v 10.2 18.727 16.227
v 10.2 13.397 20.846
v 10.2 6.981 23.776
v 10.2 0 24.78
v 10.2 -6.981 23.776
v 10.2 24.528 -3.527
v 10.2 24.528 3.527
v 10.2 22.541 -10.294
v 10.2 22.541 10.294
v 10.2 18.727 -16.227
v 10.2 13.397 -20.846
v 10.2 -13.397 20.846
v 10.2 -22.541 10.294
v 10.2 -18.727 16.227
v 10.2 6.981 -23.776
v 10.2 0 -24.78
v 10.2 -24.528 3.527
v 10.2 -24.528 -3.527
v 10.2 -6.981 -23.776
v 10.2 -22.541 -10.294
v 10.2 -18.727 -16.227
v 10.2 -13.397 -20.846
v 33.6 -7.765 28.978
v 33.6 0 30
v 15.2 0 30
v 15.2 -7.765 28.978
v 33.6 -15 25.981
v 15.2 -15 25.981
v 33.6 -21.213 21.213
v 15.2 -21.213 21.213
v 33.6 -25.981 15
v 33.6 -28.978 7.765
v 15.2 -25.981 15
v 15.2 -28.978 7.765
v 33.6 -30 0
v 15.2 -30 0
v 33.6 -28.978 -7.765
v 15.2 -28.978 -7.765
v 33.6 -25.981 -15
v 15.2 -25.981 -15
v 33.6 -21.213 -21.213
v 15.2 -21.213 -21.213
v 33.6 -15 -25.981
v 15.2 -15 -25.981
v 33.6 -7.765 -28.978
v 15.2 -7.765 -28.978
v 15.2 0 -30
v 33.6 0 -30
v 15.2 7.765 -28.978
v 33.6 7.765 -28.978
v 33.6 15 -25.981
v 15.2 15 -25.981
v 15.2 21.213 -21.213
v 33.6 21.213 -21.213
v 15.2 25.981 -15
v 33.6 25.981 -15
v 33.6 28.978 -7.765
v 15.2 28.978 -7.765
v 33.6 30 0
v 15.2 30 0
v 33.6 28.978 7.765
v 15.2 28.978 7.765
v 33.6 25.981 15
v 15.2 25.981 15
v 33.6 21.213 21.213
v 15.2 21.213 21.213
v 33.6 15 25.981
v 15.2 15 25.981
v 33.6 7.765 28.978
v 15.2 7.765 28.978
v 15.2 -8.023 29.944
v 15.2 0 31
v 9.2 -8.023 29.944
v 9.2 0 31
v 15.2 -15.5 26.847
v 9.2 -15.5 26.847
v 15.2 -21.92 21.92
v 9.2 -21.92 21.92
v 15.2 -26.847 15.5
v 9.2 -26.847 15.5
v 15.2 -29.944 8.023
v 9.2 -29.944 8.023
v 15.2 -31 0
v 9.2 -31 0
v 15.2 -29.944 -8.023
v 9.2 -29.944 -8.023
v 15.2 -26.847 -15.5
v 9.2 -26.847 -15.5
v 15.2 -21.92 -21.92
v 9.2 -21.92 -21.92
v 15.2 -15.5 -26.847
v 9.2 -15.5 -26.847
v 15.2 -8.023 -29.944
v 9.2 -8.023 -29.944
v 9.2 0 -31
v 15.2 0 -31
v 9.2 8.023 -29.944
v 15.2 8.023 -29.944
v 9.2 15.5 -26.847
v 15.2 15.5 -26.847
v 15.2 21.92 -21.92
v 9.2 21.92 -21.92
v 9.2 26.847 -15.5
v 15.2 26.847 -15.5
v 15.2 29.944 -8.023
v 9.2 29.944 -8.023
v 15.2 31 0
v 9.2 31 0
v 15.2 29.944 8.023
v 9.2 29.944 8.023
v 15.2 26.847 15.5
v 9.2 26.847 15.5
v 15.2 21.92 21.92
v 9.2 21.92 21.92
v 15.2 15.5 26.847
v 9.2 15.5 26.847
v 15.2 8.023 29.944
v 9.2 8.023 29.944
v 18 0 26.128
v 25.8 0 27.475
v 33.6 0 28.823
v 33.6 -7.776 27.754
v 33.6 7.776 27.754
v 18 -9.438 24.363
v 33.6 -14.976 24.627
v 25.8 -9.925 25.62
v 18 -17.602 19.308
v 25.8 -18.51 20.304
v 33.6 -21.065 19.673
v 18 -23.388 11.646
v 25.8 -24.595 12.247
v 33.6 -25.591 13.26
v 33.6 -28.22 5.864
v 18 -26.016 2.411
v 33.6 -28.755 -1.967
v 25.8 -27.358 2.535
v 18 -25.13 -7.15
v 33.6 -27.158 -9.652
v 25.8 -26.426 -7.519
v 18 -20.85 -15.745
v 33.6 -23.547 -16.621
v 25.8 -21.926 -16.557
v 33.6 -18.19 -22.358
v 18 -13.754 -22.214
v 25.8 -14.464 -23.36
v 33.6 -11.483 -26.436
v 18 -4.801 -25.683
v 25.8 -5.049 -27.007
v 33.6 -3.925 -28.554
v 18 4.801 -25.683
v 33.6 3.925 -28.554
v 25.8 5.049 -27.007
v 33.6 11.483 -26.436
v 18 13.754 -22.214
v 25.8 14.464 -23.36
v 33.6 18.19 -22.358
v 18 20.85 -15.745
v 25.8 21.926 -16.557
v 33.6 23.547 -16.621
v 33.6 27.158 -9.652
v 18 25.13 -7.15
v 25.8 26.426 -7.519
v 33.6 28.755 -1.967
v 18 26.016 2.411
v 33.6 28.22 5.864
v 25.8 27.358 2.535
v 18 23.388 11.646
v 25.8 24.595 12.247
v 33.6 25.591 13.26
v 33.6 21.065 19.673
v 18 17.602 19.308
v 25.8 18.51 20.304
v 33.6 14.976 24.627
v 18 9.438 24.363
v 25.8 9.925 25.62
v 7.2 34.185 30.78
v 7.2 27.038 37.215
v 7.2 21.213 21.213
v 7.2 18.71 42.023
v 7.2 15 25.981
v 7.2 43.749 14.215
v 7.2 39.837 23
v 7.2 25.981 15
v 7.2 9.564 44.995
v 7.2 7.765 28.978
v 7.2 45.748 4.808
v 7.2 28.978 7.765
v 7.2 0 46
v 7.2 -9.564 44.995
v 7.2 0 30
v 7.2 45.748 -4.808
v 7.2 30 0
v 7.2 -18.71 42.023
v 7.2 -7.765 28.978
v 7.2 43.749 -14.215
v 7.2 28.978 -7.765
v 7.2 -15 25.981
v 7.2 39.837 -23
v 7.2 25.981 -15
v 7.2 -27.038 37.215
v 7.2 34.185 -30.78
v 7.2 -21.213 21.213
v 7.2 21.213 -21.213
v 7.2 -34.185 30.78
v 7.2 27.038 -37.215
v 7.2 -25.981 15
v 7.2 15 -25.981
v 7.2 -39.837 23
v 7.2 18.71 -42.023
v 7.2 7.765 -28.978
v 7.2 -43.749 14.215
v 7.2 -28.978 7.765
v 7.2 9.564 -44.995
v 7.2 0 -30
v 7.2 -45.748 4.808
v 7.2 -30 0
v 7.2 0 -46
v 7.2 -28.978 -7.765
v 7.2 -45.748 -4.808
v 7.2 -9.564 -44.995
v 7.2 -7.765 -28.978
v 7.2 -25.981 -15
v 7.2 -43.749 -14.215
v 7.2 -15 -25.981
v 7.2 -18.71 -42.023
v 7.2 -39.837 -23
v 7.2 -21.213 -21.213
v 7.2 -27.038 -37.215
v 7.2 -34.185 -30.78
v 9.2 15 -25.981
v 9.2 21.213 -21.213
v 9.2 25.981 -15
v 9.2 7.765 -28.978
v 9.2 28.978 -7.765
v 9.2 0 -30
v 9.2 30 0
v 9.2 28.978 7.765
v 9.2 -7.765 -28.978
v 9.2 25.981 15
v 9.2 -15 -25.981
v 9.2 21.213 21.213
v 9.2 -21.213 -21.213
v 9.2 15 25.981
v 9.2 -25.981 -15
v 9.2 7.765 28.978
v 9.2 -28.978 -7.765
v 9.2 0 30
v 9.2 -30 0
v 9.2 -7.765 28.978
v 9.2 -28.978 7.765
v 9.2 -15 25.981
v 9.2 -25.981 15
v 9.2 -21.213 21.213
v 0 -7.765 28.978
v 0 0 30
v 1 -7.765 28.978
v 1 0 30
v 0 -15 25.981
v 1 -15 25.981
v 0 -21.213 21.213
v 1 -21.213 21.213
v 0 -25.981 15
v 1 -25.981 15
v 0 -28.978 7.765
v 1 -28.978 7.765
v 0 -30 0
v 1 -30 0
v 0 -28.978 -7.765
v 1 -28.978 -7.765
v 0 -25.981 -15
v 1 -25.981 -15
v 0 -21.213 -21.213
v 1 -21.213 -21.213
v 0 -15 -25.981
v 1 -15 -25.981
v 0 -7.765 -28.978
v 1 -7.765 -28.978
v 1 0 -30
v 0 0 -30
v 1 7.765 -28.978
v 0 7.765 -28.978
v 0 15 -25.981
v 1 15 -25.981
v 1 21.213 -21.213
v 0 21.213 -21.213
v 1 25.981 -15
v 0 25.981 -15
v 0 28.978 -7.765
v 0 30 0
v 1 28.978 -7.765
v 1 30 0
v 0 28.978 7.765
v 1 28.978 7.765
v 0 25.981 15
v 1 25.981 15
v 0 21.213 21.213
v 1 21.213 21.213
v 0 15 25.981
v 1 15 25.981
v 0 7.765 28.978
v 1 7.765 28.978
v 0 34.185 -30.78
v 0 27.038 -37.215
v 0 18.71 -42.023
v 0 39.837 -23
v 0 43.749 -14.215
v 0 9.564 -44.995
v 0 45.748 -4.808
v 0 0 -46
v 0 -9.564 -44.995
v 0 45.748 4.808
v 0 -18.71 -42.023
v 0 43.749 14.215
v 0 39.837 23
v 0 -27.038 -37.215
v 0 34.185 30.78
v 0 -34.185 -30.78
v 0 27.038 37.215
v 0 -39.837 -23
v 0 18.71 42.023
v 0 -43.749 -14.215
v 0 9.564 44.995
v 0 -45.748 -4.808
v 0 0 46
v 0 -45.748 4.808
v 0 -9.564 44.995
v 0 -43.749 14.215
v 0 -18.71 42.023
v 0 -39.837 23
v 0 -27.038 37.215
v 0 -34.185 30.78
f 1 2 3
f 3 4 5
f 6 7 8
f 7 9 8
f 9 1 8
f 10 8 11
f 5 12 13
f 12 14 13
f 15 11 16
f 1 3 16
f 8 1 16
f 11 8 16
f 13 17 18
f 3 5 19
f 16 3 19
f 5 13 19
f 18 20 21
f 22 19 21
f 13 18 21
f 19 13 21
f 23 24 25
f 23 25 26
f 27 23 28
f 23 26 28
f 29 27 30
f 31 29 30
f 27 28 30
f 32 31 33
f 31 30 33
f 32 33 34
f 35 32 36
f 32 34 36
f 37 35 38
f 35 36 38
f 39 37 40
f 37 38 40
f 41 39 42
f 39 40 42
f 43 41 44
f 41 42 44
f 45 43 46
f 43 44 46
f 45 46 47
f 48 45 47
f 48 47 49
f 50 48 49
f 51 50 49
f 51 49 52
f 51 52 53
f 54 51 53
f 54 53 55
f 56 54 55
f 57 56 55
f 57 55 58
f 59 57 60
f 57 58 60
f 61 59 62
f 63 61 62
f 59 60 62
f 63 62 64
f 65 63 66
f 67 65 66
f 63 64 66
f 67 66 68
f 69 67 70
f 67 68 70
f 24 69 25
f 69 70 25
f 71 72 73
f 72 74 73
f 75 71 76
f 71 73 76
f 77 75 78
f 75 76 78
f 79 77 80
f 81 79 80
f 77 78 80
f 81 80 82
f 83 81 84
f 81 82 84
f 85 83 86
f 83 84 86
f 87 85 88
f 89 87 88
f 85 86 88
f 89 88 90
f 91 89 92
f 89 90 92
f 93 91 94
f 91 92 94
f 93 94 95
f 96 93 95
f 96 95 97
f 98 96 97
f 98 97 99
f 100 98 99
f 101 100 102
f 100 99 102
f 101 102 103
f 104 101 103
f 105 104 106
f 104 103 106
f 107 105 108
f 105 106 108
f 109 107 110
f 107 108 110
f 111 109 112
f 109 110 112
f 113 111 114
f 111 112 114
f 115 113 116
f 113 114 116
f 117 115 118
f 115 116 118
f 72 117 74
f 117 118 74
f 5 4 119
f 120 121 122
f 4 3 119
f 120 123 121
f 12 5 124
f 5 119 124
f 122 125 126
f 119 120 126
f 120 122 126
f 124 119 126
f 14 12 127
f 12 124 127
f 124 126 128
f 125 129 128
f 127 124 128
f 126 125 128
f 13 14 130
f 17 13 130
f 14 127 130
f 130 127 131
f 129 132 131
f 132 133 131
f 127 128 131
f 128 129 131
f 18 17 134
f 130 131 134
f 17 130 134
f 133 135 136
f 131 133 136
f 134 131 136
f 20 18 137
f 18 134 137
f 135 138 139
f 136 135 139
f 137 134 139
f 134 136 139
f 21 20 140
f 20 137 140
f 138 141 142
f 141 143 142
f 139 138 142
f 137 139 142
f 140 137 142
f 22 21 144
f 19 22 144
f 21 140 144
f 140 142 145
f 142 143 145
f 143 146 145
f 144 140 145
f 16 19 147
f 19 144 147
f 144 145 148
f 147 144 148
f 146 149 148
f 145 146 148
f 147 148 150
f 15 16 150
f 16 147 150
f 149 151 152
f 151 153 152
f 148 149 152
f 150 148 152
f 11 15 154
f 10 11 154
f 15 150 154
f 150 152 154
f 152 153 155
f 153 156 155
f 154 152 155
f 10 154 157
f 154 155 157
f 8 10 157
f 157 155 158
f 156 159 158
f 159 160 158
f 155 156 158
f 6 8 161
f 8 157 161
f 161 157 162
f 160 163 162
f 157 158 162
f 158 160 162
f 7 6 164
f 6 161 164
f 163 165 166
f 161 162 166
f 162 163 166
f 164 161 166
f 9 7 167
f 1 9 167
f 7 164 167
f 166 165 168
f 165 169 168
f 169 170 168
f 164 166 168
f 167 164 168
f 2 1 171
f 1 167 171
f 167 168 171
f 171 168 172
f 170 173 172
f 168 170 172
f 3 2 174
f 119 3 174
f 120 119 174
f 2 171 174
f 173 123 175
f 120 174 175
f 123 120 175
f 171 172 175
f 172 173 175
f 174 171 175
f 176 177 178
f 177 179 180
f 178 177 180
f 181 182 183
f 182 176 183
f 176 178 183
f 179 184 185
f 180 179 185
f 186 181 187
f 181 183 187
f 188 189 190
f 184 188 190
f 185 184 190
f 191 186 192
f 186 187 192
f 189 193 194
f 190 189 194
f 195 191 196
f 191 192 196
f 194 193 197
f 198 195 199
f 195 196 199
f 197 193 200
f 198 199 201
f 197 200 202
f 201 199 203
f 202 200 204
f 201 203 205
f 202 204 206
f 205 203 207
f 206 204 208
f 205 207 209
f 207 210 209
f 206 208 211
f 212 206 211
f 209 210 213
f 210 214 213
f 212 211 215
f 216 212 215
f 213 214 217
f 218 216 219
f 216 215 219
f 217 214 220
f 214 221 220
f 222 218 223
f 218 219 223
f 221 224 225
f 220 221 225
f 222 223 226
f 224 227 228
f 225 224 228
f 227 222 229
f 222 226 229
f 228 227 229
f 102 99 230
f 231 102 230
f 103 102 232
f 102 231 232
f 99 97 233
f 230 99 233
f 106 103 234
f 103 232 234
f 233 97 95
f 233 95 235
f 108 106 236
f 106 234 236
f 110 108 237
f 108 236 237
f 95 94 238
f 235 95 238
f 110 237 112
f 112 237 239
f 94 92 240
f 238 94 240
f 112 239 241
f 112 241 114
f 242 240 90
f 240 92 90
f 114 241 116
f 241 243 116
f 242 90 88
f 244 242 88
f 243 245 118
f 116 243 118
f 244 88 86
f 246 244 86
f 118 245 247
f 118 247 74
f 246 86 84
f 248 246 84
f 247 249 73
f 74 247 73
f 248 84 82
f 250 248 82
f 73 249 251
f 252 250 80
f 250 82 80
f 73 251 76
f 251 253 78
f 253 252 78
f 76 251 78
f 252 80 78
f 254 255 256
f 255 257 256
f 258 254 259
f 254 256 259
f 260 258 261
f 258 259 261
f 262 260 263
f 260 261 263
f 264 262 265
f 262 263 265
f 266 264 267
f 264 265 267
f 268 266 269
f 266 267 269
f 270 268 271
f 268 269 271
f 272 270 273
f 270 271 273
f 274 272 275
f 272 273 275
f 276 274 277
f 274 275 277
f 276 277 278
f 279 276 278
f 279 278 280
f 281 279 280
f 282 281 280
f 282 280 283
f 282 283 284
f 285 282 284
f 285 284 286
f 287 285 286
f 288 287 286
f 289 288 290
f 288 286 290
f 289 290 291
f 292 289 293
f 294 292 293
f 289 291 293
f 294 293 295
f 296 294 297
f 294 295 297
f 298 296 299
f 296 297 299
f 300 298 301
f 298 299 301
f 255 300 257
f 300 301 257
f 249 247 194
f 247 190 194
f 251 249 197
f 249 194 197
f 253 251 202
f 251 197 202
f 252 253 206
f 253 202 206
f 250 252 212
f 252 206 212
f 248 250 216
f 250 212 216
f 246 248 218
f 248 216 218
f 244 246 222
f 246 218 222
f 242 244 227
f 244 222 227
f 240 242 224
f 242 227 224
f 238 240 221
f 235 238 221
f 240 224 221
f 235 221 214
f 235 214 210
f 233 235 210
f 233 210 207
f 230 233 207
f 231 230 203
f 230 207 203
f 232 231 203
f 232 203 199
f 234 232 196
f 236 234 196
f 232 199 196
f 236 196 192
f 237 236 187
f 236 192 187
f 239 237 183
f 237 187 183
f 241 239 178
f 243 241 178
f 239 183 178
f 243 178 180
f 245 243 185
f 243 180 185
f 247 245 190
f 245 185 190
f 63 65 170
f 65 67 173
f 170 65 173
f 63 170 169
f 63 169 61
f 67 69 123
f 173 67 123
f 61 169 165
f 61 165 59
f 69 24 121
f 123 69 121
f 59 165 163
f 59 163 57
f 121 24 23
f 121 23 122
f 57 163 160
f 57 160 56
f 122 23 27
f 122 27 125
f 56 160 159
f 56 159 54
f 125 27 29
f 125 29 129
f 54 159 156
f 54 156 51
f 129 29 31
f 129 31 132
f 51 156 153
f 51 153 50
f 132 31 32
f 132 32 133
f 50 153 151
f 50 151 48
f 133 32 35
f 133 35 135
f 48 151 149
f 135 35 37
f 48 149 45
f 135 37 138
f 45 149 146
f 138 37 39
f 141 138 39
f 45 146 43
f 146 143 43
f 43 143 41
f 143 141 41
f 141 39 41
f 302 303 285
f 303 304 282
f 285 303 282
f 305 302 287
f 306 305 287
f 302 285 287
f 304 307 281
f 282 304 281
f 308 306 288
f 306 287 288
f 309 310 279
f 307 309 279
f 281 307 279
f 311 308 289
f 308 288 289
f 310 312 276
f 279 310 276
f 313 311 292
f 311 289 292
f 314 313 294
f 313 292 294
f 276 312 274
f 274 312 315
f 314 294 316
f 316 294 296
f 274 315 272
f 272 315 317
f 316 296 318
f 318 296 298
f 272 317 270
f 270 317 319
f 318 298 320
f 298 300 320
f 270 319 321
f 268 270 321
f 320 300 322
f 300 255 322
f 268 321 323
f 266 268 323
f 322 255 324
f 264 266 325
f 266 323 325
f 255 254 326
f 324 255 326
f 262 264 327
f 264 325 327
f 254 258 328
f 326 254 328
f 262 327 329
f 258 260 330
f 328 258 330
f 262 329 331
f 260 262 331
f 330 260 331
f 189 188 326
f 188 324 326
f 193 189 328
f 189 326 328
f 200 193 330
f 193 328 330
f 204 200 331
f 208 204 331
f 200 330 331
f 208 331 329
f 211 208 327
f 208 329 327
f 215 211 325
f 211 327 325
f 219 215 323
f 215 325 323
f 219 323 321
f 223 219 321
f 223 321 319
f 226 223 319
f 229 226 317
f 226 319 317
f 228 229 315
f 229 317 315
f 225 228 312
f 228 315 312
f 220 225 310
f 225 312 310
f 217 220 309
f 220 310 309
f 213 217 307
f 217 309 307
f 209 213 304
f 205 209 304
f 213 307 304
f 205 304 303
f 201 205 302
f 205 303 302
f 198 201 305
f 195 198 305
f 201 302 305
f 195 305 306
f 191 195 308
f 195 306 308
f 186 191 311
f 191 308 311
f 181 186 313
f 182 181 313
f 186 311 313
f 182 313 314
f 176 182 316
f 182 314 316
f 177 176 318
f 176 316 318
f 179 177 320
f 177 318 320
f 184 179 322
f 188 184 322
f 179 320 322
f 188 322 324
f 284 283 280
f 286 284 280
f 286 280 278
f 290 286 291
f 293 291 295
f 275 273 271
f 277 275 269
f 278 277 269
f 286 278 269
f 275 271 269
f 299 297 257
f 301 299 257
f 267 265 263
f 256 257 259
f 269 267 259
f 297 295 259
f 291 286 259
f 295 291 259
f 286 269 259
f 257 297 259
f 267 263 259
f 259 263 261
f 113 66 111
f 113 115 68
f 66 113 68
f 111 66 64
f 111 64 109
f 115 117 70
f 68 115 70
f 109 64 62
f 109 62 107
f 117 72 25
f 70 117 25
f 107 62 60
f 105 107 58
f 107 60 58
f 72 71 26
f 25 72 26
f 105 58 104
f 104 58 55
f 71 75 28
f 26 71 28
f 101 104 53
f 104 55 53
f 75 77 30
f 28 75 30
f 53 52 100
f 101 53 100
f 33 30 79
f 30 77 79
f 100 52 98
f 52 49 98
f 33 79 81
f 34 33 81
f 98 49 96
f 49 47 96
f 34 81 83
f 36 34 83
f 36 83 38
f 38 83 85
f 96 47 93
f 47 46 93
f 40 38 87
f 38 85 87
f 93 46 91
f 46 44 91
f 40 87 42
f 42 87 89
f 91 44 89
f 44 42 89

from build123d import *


with BuildPart() as part:
    # 草图1 → 旋转1 (revolve)
    with BuildSketch(Plane.XY, mode=Mode.PRIVATE) as revolve_1_sk:
        Polygon((0, 30), (1, 30), (1, 17), (1, 0), (10.2, 0), (10.2, 17), (10.2, 24.78), (33.6, 28.8226), (33.6, 30), (15.2, 30), (15.2, 31), (9.2, 31), (9.2, 30), (7.2, 30), (7.2, 46), (0, 46), align=None)
    revolve(revolve_1_sk.sketch.rotate(Axis((0, 0, 0), (1, 0, 0)), 90), axis=Axis((0, 0, 0), (1, 0, 0)))


solid = part.part
